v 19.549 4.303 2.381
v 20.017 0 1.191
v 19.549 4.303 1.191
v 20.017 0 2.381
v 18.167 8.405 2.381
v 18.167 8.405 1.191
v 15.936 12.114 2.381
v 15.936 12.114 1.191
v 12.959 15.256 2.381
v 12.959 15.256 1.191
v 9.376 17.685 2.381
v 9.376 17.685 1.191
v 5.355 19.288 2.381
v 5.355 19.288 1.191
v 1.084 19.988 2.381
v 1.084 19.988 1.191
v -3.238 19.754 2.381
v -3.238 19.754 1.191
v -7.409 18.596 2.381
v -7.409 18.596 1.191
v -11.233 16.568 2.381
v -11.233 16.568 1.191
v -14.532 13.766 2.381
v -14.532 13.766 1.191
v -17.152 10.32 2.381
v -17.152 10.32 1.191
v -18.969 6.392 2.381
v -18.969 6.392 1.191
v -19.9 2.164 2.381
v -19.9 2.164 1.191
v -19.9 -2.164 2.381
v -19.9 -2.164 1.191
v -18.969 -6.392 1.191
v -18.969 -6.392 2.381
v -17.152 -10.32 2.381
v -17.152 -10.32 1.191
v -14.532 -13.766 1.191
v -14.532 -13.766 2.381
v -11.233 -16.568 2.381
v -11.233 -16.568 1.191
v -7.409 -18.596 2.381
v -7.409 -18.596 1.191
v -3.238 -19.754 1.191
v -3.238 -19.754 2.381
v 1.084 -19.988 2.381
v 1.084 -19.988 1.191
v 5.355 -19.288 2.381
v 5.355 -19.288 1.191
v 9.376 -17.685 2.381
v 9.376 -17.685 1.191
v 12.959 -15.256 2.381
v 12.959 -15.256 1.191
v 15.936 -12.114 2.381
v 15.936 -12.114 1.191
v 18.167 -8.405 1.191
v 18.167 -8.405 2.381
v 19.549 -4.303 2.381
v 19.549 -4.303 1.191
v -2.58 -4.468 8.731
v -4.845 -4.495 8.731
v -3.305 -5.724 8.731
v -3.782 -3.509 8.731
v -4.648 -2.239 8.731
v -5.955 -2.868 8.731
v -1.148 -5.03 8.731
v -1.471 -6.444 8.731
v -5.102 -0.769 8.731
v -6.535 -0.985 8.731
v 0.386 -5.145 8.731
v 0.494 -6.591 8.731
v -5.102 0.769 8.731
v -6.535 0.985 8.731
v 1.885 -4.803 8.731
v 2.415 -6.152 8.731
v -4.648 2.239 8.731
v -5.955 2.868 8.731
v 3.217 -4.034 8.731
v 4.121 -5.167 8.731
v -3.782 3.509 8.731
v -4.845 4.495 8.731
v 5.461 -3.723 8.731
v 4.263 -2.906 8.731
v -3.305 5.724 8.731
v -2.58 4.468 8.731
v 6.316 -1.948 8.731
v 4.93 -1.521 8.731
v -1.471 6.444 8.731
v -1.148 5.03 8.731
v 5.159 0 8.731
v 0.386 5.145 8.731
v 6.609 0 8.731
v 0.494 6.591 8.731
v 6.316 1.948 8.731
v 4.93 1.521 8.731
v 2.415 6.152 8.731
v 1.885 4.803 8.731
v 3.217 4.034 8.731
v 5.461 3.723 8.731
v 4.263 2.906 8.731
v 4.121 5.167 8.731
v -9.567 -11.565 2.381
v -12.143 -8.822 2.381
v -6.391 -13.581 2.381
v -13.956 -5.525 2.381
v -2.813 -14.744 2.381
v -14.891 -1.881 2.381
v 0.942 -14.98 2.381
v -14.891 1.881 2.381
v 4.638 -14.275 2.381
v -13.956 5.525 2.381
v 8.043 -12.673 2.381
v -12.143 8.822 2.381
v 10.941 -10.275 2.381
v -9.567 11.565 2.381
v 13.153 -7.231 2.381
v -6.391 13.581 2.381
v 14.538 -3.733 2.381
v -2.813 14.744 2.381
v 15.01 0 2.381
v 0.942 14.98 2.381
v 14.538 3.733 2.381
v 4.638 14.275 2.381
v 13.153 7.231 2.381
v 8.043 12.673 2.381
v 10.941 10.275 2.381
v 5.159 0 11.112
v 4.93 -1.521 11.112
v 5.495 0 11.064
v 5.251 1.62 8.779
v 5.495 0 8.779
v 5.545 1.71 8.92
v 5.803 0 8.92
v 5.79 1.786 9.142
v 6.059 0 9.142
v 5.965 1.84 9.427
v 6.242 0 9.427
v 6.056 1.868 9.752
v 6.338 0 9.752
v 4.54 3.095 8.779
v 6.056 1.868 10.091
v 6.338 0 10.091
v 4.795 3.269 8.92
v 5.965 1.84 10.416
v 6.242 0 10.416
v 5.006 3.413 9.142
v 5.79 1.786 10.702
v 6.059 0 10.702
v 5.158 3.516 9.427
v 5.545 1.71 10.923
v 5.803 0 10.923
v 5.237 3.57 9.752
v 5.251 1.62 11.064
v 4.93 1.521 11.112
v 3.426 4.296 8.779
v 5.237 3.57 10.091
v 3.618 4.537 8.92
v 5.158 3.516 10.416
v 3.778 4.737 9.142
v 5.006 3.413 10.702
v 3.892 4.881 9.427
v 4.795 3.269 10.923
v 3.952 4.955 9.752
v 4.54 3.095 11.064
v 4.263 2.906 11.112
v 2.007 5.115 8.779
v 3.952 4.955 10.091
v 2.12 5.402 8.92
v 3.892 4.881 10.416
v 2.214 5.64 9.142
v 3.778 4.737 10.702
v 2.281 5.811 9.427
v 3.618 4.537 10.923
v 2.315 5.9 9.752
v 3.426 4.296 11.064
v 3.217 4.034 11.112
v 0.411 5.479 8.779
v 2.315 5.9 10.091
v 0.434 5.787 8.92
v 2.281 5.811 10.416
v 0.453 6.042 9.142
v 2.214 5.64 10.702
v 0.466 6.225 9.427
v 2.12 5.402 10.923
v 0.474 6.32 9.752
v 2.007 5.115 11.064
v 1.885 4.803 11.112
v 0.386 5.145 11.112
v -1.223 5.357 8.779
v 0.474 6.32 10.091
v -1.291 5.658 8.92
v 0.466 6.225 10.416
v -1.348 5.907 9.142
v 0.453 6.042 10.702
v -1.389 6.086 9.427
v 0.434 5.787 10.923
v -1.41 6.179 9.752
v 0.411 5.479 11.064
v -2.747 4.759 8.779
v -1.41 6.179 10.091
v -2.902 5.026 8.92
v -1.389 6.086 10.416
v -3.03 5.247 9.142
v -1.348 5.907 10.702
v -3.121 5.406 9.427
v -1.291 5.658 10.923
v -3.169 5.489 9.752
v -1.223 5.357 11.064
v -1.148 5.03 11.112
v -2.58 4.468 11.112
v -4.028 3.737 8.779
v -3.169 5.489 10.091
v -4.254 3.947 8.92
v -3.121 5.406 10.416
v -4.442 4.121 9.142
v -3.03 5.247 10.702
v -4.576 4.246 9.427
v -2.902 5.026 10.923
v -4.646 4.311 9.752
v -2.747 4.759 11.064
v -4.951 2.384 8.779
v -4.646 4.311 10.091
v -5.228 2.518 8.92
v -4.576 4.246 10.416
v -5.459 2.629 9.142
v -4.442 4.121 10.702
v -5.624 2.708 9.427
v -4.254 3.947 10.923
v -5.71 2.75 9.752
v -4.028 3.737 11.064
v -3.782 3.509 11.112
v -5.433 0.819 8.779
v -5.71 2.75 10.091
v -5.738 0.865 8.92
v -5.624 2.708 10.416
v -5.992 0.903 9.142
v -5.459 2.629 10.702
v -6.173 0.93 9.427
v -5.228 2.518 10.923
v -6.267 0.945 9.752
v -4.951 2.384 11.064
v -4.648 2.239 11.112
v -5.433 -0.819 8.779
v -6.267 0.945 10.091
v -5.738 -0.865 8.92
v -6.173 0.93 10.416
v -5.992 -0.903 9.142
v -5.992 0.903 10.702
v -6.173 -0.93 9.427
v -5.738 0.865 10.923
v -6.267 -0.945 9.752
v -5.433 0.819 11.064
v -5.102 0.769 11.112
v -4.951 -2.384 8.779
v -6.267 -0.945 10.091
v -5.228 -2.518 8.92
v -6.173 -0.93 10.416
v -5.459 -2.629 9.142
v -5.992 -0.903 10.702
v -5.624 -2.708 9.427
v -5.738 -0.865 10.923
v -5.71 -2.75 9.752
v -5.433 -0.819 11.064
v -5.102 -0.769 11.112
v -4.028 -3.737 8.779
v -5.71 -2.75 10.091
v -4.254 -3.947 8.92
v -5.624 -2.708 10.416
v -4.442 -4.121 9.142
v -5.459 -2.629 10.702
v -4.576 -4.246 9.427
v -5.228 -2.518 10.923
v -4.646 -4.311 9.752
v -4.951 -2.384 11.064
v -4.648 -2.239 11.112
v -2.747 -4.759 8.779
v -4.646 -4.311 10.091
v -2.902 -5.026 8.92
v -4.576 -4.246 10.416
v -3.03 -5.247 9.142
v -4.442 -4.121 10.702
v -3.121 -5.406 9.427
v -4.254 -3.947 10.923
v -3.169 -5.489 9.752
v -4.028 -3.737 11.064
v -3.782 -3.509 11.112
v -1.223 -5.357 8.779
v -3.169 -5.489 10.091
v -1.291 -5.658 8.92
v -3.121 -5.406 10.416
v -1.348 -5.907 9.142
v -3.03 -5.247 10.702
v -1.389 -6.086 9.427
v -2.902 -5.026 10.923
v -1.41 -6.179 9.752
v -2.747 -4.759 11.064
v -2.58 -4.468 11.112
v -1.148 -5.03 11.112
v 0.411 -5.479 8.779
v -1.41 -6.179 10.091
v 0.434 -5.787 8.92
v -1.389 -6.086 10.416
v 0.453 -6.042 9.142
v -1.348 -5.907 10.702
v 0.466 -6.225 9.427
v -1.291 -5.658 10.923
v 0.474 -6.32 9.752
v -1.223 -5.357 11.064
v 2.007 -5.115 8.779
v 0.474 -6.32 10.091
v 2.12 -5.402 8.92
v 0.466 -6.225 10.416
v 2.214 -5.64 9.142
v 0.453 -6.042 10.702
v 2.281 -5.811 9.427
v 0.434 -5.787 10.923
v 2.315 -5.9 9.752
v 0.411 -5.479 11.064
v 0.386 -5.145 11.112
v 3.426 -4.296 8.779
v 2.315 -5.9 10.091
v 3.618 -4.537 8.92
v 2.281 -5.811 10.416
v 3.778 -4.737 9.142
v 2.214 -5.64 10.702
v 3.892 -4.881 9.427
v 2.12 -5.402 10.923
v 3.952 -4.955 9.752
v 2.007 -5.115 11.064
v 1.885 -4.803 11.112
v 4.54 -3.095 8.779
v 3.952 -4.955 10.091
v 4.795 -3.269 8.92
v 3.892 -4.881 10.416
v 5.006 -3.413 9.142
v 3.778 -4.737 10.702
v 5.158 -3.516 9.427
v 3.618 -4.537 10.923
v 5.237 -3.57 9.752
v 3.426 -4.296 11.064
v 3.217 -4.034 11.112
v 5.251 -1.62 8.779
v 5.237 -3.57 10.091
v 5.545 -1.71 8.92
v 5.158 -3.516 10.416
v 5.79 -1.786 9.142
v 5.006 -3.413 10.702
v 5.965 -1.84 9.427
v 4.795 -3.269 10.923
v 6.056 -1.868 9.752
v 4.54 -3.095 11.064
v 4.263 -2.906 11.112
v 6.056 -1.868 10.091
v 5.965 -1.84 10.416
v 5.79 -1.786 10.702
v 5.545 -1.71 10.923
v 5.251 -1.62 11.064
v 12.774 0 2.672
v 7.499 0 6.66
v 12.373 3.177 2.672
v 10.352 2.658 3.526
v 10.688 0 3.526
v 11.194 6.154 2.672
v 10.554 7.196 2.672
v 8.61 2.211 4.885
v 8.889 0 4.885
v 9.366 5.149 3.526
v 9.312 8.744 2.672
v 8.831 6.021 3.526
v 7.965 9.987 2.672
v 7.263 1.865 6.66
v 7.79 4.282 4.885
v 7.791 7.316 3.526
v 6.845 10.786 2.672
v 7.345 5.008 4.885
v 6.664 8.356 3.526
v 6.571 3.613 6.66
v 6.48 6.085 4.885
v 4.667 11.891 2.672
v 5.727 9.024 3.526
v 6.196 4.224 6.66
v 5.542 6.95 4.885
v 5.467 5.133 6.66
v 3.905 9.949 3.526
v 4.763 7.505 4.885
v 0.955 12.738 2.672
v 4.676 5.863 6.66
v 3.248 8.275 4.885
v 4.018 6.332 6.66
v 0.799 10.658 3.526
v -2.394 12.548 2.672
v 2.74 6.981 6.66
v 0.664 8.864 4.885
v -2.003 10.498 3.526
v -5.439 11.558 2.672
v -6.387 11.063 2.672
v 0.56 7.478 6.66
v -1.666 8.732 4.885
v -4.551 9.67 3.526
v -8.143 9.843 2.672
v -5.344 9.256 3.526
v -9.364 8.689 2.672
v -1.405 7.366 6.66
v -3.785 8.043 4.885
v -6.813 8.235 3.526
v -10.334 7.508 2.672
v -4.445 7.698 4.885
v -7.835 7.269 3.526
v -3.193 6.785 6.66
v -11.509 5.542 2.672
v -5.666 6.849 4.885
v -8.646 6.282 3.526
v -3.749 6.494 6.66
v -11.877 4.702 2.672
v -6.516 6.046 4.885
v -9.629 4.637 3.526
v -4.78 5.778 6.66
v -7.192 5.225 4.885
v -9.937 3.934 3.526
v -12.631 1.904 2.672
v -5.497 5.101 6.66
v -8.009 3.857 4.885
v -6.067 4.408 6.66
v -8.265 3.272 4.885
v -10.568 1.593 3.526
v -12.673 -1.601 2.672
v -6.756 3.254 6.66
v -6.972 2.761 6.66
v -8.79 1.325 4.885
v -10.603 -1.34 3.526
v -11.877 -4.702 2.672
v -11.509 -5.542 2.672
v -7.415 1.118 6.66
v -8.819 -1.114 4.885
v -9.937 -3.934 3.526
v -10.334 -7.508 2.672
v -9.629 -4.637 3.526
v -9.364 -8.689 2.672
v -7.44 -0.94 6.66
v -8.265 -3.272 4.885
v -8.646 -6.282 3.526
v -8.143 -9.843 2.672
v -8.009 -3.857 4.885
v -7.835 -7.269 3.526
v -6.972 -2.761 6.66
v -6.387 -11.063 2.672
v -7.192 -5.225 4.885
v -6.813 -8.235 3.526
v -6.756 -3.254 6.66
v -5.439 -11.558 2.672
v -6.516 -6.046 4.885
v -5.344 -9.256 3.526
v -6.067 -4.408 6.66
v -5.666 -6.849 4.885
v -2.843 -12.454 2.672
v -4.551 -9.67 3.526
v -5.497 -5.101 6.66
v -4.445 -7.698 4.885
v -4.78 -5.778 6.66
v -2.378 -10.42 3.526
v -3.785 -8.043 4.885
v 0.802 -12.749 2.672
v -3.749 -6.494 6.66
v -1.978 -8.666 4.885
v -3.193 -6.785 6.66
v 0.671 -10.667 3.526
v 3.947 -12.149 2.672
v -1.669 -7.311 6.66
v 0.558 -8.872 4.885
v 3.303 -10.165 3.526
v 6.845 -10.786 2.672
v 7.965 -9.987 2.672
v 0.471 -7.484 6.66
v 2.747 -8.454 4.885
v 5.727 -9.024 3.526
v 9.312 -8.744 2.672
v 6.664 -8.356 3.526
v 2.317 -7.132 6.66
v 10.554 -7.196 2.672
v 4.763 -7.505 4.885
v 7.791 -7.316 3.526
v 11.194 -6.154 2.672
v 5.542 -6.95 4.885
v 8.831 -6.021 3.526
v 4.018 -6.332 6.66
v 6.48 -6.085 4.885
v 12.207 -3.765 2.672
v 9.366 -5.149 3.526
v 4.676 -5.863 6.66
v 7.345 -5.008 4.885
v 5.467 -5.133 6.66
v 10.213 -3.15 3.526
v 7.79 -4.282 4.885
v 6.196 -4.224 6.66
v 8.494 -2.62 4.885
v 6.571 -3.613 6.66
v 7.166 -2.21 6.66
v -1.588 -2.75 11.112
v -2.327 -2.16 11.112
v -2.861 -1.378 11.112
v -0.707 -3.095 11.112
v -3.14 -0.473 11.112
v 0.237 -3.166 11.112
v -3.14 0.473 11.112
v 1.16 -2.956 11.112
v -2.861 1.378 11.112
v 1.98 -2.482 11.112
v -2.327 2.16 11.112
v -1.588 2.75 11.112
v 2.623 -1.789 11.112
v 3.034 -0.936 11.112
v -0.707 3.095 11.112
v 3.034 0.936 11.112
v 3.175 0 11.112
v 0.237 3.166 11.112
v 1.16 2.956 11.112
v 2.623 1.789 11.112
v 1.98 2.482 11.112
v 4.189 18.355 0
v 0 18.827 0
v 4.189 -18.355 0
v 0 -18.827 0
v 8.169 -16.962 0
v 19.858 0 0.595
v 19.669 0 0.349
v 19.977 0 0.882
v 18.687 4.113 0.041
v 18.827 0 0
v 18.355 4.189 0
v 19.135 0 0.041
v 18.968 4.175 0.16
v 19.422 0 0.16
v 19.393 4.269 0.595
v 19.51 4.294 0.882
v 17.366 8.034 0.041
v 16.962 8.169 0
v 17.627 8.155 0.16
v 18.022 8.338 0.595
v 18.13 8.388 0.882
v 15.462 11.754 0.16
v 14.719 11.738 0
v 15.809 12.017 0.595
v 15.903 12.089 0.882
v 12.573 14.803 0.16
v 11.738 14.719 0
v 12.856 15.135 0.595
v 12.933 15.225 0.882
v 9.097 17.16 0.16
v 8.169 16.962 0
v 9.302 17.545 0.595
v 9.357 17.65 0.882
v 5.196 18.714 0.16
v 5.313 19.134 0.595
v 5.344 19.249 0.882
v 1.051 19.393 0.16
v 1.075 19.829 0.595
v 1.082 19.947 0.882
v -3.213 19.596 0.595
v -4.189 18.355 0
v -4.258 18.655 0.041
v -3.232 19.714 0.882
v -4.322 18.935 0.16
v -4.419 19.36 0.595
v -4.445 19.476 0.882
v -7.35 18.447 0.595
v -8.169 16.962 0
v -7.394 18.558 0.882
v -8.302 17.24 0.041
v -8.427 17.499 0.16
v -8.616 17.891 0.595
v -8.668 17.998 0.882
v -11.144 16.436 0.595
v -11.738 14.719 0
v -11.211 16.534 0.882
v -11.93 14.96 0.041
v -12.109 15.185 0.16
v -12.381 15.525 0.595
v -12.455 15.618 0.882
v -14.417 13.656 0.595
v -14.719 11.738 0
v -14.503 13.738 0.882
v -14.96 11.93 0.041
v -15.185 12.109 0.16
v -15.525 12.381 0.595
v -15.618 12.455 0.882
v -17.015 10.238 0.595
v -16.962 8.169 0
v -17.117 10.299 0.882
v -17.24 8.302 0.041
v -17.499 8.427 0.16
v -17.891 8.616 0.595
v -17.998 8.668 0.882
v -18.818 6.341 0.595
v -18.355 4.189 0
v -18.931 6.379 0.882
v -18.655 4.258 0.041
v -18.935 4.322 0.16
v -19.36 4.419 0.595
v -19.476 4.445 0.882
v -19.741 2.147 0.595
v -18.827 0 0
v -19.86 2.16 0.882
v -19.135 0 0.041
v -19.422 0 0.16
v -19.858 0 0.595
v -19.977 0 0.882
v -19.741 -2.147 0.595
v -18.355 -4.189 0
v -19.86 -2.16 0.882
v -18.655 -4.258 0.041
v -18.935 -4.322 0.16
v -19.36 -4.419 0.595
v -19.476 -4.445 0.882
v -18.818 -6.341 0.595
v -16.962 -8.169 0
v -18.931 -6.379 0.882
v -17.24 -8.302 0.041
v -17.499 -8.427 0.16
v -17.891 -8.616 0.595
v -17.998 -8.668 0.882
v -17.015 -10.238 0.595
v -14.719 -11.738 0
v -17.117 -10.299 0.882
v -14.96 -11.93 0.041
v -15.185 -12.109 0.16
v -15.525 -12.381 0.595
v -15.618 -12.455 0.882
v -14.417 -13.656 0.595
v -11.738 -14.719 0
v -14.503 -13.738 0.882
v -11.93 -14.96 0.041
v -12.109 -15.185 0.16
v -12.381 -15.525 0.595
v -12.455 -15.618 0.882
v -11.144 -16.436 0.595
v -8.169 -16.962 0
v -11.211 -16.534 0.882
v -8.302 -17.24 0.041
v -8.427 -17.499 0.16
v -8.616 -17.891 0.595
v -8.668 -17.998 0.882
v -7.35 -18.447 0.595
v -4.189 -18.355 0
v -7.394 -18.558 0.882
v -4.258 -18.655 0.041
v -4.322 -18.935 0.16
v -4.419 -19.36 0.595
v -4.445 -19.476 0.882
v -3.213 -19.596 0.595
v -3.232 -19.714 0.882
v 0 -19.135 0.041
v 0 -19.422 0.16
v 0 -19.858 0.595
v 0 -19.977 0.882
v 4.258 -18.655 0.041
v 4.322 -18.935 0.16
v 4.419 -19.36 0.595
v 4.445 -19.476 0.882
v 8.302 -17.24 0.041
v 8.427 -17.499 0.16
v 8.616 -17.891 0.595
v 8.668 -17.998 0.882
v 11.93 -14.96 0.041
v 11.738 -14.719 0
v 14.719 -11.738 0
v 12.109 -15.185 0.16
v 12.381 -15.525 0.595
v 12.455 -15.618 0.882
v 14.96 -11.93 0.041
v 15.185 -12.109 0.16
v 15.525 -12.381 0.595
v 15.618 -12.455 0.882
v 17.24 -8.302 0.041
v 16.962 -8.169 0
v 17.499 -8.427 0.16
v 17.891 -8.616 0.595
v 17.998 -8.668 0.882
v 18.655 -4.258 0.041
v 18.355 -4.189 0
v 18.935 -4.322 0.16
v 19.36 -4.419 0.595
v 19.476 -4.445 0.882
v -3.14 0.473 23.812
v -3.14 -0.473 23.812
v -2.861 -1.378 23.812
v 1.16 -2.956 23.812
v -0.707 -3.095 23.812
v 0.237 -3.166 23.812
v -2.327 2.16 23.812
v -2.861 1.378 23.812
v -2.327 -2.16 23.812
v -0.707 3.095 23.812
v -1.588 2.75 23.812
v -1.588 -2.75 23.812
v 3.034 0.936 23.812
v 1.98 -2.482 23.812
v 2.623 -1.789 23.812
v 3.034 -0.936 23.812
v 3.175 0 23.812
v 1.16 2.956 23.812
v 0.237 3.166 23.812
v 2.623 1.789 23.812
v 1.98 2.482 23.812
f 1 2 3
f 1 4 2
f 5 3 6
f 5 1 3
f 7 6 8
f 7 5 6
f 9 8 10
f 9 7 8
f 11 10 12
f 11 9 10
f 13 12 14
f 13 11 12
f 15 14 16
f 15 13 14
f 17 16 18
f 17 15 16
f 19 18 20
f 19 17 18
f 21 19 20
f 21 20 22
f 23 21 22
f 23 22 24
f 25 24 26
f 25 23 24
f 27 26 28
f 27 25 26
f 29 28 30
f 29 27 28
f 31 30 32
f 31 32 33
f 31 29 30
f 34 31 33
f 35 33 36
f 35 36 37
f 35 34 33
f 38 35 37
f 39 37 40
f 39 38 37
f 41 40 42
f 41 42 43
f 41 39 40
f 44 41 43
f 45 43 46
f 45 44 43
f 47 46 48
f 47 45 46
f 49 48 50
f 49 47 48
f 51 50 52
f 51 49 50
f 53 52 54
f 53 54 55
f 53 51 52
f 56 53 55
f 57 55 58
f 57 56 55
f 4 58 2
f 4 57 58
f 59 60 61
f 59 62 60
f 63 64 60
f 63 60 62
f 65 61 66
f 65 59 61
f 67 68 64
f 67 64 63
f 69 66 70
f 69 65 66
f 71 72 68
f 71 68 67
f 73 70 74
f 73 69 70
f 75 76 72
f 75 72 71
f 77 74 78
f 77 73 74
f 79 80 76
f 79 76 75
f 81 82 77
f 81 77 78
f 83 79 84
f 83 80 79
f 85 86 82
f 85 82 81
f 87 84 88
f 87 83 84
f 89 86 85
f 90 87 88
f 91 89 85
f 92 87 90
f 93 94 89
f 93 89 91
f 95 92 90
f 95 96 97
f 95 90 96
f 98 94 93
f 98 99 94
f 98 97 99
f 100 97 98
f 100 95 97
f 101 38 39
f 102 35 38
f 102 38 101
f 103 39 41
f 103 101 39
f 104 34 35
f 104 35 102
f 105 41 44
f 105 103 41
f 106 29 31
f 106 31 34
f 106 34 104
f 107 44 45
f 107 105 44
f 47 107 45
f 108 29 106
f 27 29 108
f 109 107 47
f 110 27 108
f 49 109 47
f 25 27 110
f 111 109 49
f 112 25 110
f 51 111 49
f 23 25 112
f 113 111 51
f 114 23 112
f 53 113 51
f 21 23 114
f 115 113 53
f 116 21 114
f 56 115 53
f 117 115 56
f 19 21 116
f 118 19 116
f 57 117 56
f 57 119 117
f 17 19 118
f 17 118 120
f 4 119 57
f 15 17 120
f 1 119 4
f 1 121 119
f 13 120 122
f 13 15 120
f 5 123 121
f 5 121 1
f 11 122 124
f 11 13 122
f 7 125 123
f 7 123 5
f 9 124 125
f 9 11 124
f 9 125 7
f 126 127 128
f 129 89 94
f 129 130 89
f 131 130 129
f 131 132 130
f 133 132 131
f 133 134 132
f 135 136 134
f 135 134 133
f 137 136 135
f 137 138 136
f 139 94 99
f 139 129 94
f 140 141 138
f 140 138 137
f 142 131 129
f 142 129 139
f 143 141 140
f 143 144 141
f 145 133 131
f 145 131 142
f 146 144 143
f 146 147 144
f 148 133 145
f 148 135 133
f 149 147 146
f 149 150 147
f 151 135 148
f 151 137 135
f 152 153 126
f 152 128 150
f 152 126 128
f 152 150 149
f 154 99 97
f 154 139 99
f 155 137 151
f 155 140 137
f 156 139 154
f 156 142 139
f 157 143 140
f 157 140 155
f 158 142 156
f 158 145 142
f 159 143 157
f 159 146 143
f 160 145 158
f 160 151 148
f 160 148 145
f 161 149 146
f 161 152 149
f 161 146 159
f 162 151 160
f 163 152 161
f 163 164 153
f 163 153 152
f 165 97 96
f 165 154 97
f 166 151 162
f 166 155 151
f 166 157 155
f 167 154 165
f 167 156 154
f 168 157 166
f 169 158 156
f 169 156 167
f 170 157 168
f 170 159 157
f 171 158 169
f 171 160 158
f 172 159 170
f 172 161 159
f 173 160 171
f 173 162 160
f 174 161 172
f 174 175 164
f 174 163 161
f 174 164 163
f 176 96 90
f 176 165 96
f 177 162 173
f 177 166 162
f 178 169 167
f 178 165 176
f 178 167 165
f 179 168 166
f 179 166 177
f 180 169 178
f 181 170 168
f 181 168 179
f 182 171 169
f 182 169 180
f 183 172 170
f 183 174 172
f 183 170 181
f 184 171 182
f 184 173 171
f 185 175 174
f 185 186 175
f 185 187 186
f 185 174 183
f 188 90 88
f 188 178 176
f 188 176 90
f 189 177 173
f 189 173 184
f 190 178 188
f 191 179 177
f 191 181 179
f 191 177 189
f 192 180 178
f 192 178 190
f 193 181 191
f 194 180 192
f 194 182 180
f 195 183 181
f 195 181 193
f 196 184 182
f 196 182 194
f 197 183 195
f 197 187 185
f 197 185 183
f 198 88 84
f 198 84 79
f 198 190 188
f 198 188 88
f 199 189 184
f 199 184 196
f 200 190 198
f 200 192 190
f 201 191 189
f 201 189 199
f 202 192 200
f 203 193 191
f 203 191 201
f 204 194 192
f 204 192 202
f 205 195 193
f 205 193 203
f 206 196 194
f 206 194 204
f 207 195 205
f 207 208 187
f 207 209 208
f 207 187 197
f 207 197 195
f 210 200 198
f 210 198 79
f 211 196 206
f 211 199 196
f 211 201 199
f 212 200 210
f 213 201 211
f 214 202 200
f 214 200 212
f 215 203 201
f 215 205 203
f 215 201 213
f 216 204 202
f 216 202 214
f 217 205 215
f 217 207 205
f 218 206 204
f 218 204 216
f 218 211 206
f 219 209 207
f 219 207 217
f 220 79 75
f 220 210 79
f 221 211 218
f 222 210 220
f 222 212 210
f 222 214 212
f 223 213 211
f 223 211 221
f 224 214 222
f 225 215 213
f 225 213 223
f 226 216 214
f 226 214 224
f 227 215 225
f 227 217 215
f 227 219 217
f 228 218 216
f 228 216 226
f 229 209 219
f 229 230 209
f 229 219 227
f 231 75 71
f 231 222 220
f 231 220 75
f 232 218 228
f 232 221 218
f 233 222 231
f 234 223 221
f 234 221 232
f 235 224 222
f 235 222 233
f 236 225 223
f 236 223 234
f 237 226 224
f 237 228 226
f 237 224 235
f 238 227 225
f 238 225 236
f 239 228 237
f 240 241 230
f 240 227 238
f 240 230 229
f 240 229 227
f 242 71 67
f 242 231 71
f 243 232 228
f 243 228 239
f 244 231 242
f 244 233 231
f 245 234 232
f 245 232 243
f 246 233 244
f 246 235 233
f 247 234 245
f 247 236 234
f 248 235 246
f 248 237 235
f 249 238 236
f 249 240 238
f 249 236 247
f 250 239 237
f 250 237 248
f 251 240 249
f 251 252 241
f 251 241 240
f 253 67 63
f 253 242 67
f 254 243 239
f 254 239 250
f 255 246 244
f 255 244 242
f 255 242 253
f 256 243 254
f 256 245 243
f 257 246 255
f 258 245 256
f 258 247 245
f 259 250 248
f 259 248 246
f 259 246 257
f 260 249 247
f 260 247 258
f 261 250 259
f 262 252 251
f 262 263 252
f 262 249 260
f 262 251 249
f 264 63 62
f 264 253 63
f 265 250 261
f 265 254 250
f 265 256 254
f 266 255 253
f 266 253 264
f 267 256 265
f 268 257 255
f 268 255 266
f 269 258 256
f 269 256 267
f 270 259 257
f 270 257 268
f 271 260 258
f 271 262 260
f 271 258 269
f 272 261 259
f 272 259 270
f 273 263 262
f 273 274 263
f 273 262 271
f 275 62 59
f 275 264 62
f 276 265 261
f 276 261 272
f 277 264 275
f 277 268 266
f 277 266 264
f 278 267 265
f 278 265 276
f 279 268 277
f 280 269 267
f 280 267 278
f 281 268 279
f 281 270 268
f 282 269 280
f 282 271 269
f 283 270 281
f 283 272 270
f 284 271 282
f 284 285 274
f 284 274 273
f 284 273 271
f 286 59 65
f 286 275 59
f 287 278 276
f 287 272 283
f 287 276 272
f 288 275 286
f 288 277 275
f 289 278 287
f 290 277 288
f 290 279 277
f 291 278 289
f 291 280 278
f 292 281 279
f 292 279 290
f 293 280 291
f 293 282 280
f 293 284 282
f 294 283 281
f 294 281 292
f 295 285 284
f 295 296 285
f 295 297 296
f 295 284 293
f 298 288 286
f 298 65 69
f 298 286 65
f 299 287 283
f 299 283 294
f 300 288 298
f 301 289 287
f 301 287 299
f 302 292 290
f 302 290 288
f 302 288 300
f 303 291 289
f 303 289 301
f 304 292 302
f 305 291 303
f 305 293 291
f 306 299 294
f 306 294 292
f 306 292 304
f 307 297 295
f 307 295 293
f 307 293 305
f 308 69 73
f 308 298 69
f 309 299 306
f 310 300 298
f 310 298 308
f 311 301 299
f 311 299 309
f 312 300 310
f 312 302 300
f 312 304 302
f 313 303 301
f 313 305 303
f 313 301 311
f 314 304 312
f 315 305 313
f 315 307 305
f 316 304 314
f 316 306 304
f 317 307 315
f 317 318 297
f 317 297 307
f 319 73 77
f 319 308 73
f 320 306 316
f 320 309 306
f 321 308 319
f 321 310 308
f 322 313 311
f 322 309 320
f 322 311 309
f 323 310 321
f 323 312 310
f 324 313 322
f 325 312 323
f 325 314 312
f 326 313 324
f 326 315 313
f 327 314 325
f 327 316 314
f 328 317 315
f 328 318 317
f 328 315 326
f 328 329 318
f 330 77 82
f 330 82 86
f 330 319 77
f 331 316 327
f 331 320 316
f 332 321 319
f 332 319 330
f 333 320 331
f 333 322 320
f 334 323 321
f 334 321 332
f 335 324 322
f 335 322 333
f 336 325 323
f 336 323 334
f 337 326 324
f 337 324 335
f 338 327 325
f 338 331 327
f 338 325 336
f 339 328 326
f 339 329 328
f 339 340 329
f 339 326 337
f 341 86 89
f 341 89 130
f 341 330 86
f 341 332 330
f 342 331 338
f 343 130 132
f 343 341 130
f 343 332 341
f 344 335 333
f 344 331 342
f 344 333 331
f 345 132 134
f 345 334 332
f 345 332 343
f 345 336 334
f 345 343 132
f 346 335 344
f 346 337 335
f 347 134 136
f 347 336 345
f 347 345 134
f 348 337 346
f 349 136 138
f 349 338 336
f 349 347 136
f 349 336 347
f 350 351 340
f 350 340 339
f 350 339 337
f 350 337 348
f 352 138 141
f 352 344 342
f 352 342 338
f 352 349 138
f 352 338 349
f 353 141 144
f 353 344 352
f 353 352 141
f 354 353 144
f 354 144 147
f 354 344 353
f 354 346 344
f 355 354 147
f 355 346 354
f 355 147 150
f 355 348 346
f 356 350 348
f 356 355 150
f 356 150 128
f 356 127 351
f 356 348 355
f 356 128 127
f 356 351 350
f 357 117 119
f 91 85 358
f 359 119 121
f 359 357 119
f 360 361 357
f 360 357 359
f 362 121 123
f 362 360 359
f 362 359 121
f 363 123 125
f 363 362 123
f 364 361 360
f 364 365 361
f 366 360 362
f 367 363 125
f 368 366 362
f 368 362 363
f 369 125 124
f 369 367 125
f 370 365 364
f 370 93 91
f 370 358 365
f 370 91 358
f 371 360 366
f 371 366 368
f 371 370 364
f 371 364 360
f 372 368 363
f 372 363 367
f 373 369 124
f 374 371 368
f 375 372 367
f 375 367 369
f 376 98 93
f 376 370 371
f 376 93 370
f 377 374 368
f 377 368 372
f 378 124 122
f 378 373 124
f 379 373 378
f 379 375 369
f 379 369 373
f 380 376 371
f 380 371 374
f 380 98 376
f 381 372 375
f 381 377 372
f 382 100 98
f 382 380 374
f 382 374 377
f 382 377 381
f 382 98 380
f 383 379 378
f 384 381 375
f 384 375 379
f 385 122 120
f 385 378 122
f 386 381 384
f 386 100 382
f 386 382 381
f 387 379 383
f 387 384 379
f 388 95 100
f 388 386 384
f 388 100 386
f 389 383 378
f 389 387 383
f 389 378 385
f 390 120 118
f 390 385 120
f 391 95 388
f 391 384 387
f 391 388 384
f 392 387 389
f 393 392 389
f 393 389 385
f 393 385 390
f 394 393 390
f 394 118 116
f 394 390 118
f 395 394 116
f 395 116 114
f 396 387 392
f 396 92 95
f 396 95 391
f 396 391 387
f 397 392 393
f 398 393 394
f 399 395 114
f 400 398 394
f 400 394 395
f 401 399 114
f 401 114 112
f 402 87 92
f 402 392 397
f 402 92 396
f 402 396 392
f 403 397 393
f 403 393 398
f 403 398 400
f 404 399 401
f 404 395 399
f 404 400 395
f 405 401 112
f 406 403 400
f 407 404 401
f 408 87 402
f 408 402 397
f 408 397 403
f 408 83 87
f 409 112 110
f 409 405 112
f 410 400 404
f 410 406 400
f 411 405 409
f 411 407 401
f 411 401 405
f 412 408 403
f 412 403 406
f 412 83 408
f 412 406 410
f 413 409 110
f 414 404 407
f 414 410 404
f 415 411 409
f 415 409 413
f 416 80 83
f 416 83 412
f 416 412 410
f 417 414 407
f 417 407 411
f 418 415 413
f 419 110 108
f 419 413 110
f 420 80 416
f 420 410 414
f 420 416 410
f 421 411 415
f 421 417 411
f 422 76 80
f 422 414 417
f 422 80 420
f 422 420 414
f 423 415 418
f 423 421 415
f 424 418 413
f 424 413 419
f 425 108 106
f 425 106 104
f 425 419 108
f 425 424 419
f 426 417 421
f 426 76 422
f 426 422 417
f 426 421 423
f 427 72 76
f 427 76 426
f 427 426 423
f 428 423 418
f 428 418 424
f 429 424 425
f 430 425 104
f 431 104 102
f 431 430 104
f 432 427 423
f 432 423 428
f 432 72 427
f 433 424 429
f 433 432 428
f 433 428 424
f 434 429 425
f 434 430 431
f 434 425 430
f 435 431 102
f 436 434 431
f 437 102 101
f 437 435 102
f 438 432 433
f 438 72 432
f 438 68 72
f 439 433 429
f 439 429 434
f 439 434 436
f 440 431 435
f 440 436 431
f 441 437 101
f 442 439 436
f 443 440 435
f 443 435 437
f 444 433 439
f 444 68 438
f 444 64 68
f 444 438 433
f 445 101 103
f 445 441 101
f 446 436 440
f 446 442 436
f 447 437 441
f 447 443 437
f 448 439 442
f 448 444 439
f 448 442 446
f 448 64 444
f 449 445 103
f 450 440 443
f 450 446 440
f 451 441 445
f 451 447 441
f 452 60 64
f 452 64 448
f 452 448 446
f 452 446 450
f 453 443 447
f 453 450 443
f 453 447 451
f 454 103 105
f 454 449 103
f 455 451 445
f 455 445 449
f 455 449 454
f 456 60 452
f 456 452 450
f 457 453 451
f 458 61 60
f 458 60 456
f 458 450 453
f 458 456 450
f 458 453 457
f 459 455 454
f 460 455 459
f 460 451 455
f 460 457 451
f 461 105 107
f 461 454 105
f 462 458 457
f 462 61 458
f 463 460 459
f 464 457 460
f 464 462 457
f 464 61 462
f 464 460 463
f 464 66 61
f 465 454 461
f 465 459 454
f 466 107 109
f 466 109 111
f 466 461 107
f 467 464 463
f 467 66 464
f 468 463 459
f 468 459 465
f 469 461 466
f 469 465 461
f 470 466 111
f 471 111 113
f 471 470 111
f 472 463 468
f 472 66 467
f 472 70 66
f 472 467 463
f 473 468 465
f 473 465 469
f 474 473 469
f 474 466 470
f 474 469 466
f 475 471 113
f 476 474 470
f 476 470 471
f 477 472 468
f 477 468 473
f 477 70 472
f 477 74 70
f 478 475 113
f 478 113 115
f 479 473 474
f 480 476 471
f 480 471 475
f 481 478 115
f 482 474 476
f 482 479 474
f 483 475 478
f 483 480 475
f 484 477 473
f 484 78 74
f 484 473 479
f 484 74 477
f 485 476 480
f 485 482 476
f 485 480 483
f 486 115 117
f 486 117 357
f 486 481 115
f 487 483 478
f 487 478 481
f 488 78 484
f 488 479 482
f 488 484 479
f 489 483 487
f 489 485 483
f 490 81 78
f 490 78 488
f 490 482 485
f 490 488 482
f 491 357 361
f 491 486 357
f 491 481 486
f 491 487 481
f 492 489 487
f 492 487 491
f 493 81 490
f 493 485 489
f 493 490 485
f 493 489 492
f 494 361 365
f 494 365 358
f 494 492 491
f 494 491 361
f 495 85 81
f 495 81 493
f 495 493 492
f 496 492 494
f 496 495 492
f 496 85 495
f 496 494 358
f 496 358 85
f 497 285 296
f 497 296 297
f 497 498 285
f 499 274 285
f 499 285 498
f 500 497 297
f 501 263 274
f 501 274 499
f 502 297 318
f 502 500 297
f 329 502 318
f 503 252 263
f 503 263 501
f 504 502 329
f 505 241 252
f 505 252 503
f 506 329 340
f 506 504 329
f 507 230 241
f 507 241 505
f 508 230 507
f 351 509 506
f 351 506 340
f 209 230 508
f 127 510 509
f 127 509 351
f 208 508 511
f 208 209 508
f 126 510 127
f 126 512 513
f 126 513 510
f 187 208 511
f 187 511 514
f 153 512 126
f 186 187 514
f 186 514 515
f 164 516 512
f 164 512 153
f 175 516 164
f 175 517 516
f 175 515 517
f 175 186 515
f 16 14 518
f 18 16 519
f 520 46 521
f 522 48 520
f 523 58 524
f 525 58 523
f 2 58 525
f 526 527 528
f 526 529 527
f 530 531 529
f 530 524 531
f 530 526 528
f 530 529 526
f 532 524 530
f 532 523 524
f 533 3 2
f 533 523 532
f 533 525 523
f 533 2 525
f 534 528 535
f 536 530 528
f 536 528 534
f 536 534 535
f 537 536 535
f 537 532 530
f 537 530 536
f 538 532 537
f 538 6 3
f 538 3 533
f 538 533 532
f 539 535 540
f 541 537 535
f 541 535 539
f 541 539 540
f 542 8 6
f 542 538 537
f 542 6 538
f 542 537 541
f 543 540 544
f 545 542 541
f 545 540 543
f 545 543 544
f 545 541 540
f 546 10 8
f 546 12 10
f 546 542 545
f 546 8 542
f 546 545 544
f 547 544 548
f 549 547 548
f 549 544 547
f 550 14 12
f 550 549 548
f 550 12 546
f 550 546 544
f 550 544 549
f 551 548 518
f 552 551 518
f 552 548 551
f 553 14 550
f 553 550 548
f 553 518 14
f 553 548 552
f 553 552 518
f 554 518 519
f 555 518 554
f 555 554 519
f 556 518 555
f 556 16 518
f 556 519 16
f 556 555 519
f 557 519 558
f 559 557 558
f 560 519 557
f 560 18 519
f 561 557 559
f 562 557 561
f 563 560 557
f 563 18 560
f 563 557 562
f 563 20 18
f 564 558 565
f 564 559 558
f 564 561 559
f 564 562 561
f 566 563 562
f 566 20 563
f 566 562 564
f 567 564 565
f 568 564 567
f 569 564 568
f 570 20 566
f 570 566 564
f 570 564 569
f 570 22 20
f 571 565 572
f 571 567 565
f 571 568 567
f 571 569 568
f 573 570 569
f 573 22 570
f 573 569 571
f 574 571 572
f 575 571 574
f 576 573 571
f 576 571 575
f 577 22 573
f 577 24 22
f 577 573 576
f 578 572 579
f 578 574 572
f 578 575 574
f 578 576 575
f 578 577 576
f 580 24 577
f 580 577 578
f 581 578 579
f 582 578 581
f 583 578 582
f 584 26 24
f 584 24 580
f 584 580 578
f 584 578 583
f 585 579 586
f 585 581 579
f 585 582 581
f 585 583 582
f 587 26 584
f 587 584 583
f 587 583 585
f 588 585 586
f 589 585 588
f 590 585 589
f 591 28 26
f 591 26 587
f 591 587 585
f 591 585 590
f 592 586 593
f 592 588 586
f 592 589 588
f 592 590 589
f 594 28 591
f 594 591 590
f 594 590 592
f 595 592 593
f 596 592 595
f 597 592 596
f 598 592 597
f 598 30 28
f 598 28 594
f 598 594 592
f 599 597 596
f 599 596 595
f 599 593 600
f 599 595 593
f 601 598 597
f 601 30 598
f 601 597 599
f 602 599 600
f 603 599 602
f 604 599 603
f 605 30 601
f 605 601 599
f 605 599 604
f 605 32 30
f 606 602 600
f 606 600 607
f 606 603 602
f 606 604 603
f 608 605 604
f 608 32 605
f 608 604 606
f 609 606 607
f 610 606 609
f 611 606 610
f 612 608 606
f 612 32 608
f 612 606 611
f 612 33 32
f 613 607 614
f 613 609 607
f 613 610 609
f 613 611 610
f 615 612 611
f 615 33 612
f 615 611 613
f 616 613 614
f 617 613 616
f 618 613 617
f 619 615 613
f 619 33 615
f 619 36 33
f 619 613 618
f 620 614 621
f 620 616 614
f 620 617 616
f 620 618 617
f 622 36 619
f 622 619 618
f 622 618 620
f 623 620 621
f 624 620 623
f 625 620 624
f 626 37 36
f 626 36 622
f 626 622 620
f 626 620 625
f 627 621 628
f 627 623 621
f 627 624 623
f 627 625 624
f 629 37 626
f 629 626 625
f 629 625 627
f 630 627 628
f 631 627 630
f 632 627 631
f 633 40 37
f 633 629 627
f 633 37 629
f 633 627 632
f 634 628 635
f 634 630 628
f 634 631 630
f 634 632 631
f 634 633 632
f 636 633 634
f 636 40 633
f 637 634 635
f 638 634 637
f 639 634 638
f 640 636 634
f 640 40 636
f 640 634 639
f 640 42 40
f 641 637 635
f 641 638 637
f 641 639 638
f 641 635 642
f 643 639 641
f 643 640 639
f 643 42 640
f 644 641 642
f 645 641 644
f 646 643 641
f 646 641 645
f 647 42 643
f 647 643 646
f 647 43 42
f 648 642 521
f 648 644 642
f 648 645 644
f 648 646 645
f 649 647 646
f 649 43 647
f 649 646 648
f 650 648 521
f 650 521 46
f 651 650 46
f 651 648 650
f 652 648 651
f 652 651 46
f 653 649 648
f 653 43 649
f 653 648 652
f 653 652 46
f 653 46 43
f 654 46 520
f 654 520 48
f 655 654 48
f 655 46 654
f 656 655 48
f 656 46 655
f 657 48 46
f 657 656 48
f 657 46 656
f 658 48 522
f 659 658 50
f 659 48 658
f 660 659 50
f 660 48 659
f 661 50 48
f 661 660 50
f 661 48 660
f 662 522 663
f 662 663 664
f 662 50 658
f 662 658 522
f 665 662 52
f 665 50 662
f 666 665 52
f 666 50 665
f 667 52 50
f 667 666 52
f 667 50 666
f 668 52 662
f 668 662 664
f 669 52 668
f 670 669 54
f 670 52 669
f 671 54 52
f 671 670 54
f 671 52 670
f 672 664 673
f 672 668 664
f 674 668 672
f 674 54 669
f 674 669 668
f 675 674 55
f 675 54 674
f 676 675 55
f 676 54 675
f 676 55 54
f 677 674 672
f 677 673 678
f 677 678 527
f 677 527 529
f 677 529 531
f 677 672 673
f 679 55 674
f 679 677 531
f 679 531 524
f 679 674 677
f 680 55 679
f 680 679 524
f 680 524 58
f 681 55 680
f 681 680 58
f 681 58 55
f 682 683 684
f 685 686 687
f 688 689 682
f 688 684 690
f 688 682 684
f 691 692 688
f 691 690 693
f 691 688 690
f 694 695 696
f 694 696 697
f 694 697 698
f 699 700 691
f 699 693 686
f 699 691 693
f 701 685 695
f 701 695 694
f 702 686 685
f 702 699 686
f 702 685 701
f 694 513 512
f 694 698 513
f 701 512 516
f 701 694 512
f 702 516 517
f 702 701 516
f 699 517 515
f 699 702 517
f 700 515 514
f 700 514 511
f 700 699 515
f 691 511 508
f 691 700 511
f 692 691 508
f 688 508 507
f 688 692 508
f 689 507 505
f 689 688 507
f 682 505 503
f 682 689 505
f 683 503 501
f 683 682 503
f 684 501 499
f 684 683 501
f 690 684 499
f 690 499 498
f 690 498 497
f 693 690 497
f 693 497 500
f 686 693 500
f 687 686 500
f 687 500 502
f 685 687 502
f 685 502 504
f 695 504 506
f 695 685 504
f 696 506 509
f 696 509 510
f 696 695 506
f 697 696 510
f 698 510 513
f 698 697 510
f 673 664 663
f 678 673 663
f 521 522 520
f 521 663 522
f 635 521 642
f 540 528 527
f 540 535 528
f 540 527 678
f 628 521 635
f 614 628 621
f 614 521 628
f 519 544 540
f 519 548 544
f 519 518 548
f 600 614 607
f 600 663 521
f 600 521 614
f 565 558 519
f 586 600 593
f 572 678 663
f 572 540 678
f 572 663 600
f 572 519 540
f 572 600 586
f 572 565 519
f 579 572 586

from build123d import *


with BuildPart() as f1:
    # F0 (on Front) → F1 (revolve)
    with BuildSketch(Plane.XZ):
        with BuildLine():
            Line((0, 23.8125), (0, 0))
            Line((0, 0), (18.826609, 0))
            ThreePointArc((18.826609, 0), (19.668508, 0.348726), (20.017234, 1.190625))
            Line((20.017234, 1.190625), (20.017234, 2.38125))
            Line((20.017234, 2.38125), (15.009553, 2.38125))
            ThreePointArc((15.009553, 2.38125), (9.744412, 4.147372), (6.609293, 8.73125))
            Line((6.609293, 8.73125), (5.159375, 8.73125))
            ThreePointArc((5.159375, 8.73125), (6.35, 9.921875), (5.159375, 11.1125))
            Line((5.159375, 11.1125), (3.175, 11.1125))
            Line((3.175, 11.1125), (3.175, 23.8125))
            Line((3.175, 23.8125), (0, 23.8125))
        make_face()
    revolve(axis=Axis((0, 0, 11.90625), (0, 0, 1)))


solid = f1.part
